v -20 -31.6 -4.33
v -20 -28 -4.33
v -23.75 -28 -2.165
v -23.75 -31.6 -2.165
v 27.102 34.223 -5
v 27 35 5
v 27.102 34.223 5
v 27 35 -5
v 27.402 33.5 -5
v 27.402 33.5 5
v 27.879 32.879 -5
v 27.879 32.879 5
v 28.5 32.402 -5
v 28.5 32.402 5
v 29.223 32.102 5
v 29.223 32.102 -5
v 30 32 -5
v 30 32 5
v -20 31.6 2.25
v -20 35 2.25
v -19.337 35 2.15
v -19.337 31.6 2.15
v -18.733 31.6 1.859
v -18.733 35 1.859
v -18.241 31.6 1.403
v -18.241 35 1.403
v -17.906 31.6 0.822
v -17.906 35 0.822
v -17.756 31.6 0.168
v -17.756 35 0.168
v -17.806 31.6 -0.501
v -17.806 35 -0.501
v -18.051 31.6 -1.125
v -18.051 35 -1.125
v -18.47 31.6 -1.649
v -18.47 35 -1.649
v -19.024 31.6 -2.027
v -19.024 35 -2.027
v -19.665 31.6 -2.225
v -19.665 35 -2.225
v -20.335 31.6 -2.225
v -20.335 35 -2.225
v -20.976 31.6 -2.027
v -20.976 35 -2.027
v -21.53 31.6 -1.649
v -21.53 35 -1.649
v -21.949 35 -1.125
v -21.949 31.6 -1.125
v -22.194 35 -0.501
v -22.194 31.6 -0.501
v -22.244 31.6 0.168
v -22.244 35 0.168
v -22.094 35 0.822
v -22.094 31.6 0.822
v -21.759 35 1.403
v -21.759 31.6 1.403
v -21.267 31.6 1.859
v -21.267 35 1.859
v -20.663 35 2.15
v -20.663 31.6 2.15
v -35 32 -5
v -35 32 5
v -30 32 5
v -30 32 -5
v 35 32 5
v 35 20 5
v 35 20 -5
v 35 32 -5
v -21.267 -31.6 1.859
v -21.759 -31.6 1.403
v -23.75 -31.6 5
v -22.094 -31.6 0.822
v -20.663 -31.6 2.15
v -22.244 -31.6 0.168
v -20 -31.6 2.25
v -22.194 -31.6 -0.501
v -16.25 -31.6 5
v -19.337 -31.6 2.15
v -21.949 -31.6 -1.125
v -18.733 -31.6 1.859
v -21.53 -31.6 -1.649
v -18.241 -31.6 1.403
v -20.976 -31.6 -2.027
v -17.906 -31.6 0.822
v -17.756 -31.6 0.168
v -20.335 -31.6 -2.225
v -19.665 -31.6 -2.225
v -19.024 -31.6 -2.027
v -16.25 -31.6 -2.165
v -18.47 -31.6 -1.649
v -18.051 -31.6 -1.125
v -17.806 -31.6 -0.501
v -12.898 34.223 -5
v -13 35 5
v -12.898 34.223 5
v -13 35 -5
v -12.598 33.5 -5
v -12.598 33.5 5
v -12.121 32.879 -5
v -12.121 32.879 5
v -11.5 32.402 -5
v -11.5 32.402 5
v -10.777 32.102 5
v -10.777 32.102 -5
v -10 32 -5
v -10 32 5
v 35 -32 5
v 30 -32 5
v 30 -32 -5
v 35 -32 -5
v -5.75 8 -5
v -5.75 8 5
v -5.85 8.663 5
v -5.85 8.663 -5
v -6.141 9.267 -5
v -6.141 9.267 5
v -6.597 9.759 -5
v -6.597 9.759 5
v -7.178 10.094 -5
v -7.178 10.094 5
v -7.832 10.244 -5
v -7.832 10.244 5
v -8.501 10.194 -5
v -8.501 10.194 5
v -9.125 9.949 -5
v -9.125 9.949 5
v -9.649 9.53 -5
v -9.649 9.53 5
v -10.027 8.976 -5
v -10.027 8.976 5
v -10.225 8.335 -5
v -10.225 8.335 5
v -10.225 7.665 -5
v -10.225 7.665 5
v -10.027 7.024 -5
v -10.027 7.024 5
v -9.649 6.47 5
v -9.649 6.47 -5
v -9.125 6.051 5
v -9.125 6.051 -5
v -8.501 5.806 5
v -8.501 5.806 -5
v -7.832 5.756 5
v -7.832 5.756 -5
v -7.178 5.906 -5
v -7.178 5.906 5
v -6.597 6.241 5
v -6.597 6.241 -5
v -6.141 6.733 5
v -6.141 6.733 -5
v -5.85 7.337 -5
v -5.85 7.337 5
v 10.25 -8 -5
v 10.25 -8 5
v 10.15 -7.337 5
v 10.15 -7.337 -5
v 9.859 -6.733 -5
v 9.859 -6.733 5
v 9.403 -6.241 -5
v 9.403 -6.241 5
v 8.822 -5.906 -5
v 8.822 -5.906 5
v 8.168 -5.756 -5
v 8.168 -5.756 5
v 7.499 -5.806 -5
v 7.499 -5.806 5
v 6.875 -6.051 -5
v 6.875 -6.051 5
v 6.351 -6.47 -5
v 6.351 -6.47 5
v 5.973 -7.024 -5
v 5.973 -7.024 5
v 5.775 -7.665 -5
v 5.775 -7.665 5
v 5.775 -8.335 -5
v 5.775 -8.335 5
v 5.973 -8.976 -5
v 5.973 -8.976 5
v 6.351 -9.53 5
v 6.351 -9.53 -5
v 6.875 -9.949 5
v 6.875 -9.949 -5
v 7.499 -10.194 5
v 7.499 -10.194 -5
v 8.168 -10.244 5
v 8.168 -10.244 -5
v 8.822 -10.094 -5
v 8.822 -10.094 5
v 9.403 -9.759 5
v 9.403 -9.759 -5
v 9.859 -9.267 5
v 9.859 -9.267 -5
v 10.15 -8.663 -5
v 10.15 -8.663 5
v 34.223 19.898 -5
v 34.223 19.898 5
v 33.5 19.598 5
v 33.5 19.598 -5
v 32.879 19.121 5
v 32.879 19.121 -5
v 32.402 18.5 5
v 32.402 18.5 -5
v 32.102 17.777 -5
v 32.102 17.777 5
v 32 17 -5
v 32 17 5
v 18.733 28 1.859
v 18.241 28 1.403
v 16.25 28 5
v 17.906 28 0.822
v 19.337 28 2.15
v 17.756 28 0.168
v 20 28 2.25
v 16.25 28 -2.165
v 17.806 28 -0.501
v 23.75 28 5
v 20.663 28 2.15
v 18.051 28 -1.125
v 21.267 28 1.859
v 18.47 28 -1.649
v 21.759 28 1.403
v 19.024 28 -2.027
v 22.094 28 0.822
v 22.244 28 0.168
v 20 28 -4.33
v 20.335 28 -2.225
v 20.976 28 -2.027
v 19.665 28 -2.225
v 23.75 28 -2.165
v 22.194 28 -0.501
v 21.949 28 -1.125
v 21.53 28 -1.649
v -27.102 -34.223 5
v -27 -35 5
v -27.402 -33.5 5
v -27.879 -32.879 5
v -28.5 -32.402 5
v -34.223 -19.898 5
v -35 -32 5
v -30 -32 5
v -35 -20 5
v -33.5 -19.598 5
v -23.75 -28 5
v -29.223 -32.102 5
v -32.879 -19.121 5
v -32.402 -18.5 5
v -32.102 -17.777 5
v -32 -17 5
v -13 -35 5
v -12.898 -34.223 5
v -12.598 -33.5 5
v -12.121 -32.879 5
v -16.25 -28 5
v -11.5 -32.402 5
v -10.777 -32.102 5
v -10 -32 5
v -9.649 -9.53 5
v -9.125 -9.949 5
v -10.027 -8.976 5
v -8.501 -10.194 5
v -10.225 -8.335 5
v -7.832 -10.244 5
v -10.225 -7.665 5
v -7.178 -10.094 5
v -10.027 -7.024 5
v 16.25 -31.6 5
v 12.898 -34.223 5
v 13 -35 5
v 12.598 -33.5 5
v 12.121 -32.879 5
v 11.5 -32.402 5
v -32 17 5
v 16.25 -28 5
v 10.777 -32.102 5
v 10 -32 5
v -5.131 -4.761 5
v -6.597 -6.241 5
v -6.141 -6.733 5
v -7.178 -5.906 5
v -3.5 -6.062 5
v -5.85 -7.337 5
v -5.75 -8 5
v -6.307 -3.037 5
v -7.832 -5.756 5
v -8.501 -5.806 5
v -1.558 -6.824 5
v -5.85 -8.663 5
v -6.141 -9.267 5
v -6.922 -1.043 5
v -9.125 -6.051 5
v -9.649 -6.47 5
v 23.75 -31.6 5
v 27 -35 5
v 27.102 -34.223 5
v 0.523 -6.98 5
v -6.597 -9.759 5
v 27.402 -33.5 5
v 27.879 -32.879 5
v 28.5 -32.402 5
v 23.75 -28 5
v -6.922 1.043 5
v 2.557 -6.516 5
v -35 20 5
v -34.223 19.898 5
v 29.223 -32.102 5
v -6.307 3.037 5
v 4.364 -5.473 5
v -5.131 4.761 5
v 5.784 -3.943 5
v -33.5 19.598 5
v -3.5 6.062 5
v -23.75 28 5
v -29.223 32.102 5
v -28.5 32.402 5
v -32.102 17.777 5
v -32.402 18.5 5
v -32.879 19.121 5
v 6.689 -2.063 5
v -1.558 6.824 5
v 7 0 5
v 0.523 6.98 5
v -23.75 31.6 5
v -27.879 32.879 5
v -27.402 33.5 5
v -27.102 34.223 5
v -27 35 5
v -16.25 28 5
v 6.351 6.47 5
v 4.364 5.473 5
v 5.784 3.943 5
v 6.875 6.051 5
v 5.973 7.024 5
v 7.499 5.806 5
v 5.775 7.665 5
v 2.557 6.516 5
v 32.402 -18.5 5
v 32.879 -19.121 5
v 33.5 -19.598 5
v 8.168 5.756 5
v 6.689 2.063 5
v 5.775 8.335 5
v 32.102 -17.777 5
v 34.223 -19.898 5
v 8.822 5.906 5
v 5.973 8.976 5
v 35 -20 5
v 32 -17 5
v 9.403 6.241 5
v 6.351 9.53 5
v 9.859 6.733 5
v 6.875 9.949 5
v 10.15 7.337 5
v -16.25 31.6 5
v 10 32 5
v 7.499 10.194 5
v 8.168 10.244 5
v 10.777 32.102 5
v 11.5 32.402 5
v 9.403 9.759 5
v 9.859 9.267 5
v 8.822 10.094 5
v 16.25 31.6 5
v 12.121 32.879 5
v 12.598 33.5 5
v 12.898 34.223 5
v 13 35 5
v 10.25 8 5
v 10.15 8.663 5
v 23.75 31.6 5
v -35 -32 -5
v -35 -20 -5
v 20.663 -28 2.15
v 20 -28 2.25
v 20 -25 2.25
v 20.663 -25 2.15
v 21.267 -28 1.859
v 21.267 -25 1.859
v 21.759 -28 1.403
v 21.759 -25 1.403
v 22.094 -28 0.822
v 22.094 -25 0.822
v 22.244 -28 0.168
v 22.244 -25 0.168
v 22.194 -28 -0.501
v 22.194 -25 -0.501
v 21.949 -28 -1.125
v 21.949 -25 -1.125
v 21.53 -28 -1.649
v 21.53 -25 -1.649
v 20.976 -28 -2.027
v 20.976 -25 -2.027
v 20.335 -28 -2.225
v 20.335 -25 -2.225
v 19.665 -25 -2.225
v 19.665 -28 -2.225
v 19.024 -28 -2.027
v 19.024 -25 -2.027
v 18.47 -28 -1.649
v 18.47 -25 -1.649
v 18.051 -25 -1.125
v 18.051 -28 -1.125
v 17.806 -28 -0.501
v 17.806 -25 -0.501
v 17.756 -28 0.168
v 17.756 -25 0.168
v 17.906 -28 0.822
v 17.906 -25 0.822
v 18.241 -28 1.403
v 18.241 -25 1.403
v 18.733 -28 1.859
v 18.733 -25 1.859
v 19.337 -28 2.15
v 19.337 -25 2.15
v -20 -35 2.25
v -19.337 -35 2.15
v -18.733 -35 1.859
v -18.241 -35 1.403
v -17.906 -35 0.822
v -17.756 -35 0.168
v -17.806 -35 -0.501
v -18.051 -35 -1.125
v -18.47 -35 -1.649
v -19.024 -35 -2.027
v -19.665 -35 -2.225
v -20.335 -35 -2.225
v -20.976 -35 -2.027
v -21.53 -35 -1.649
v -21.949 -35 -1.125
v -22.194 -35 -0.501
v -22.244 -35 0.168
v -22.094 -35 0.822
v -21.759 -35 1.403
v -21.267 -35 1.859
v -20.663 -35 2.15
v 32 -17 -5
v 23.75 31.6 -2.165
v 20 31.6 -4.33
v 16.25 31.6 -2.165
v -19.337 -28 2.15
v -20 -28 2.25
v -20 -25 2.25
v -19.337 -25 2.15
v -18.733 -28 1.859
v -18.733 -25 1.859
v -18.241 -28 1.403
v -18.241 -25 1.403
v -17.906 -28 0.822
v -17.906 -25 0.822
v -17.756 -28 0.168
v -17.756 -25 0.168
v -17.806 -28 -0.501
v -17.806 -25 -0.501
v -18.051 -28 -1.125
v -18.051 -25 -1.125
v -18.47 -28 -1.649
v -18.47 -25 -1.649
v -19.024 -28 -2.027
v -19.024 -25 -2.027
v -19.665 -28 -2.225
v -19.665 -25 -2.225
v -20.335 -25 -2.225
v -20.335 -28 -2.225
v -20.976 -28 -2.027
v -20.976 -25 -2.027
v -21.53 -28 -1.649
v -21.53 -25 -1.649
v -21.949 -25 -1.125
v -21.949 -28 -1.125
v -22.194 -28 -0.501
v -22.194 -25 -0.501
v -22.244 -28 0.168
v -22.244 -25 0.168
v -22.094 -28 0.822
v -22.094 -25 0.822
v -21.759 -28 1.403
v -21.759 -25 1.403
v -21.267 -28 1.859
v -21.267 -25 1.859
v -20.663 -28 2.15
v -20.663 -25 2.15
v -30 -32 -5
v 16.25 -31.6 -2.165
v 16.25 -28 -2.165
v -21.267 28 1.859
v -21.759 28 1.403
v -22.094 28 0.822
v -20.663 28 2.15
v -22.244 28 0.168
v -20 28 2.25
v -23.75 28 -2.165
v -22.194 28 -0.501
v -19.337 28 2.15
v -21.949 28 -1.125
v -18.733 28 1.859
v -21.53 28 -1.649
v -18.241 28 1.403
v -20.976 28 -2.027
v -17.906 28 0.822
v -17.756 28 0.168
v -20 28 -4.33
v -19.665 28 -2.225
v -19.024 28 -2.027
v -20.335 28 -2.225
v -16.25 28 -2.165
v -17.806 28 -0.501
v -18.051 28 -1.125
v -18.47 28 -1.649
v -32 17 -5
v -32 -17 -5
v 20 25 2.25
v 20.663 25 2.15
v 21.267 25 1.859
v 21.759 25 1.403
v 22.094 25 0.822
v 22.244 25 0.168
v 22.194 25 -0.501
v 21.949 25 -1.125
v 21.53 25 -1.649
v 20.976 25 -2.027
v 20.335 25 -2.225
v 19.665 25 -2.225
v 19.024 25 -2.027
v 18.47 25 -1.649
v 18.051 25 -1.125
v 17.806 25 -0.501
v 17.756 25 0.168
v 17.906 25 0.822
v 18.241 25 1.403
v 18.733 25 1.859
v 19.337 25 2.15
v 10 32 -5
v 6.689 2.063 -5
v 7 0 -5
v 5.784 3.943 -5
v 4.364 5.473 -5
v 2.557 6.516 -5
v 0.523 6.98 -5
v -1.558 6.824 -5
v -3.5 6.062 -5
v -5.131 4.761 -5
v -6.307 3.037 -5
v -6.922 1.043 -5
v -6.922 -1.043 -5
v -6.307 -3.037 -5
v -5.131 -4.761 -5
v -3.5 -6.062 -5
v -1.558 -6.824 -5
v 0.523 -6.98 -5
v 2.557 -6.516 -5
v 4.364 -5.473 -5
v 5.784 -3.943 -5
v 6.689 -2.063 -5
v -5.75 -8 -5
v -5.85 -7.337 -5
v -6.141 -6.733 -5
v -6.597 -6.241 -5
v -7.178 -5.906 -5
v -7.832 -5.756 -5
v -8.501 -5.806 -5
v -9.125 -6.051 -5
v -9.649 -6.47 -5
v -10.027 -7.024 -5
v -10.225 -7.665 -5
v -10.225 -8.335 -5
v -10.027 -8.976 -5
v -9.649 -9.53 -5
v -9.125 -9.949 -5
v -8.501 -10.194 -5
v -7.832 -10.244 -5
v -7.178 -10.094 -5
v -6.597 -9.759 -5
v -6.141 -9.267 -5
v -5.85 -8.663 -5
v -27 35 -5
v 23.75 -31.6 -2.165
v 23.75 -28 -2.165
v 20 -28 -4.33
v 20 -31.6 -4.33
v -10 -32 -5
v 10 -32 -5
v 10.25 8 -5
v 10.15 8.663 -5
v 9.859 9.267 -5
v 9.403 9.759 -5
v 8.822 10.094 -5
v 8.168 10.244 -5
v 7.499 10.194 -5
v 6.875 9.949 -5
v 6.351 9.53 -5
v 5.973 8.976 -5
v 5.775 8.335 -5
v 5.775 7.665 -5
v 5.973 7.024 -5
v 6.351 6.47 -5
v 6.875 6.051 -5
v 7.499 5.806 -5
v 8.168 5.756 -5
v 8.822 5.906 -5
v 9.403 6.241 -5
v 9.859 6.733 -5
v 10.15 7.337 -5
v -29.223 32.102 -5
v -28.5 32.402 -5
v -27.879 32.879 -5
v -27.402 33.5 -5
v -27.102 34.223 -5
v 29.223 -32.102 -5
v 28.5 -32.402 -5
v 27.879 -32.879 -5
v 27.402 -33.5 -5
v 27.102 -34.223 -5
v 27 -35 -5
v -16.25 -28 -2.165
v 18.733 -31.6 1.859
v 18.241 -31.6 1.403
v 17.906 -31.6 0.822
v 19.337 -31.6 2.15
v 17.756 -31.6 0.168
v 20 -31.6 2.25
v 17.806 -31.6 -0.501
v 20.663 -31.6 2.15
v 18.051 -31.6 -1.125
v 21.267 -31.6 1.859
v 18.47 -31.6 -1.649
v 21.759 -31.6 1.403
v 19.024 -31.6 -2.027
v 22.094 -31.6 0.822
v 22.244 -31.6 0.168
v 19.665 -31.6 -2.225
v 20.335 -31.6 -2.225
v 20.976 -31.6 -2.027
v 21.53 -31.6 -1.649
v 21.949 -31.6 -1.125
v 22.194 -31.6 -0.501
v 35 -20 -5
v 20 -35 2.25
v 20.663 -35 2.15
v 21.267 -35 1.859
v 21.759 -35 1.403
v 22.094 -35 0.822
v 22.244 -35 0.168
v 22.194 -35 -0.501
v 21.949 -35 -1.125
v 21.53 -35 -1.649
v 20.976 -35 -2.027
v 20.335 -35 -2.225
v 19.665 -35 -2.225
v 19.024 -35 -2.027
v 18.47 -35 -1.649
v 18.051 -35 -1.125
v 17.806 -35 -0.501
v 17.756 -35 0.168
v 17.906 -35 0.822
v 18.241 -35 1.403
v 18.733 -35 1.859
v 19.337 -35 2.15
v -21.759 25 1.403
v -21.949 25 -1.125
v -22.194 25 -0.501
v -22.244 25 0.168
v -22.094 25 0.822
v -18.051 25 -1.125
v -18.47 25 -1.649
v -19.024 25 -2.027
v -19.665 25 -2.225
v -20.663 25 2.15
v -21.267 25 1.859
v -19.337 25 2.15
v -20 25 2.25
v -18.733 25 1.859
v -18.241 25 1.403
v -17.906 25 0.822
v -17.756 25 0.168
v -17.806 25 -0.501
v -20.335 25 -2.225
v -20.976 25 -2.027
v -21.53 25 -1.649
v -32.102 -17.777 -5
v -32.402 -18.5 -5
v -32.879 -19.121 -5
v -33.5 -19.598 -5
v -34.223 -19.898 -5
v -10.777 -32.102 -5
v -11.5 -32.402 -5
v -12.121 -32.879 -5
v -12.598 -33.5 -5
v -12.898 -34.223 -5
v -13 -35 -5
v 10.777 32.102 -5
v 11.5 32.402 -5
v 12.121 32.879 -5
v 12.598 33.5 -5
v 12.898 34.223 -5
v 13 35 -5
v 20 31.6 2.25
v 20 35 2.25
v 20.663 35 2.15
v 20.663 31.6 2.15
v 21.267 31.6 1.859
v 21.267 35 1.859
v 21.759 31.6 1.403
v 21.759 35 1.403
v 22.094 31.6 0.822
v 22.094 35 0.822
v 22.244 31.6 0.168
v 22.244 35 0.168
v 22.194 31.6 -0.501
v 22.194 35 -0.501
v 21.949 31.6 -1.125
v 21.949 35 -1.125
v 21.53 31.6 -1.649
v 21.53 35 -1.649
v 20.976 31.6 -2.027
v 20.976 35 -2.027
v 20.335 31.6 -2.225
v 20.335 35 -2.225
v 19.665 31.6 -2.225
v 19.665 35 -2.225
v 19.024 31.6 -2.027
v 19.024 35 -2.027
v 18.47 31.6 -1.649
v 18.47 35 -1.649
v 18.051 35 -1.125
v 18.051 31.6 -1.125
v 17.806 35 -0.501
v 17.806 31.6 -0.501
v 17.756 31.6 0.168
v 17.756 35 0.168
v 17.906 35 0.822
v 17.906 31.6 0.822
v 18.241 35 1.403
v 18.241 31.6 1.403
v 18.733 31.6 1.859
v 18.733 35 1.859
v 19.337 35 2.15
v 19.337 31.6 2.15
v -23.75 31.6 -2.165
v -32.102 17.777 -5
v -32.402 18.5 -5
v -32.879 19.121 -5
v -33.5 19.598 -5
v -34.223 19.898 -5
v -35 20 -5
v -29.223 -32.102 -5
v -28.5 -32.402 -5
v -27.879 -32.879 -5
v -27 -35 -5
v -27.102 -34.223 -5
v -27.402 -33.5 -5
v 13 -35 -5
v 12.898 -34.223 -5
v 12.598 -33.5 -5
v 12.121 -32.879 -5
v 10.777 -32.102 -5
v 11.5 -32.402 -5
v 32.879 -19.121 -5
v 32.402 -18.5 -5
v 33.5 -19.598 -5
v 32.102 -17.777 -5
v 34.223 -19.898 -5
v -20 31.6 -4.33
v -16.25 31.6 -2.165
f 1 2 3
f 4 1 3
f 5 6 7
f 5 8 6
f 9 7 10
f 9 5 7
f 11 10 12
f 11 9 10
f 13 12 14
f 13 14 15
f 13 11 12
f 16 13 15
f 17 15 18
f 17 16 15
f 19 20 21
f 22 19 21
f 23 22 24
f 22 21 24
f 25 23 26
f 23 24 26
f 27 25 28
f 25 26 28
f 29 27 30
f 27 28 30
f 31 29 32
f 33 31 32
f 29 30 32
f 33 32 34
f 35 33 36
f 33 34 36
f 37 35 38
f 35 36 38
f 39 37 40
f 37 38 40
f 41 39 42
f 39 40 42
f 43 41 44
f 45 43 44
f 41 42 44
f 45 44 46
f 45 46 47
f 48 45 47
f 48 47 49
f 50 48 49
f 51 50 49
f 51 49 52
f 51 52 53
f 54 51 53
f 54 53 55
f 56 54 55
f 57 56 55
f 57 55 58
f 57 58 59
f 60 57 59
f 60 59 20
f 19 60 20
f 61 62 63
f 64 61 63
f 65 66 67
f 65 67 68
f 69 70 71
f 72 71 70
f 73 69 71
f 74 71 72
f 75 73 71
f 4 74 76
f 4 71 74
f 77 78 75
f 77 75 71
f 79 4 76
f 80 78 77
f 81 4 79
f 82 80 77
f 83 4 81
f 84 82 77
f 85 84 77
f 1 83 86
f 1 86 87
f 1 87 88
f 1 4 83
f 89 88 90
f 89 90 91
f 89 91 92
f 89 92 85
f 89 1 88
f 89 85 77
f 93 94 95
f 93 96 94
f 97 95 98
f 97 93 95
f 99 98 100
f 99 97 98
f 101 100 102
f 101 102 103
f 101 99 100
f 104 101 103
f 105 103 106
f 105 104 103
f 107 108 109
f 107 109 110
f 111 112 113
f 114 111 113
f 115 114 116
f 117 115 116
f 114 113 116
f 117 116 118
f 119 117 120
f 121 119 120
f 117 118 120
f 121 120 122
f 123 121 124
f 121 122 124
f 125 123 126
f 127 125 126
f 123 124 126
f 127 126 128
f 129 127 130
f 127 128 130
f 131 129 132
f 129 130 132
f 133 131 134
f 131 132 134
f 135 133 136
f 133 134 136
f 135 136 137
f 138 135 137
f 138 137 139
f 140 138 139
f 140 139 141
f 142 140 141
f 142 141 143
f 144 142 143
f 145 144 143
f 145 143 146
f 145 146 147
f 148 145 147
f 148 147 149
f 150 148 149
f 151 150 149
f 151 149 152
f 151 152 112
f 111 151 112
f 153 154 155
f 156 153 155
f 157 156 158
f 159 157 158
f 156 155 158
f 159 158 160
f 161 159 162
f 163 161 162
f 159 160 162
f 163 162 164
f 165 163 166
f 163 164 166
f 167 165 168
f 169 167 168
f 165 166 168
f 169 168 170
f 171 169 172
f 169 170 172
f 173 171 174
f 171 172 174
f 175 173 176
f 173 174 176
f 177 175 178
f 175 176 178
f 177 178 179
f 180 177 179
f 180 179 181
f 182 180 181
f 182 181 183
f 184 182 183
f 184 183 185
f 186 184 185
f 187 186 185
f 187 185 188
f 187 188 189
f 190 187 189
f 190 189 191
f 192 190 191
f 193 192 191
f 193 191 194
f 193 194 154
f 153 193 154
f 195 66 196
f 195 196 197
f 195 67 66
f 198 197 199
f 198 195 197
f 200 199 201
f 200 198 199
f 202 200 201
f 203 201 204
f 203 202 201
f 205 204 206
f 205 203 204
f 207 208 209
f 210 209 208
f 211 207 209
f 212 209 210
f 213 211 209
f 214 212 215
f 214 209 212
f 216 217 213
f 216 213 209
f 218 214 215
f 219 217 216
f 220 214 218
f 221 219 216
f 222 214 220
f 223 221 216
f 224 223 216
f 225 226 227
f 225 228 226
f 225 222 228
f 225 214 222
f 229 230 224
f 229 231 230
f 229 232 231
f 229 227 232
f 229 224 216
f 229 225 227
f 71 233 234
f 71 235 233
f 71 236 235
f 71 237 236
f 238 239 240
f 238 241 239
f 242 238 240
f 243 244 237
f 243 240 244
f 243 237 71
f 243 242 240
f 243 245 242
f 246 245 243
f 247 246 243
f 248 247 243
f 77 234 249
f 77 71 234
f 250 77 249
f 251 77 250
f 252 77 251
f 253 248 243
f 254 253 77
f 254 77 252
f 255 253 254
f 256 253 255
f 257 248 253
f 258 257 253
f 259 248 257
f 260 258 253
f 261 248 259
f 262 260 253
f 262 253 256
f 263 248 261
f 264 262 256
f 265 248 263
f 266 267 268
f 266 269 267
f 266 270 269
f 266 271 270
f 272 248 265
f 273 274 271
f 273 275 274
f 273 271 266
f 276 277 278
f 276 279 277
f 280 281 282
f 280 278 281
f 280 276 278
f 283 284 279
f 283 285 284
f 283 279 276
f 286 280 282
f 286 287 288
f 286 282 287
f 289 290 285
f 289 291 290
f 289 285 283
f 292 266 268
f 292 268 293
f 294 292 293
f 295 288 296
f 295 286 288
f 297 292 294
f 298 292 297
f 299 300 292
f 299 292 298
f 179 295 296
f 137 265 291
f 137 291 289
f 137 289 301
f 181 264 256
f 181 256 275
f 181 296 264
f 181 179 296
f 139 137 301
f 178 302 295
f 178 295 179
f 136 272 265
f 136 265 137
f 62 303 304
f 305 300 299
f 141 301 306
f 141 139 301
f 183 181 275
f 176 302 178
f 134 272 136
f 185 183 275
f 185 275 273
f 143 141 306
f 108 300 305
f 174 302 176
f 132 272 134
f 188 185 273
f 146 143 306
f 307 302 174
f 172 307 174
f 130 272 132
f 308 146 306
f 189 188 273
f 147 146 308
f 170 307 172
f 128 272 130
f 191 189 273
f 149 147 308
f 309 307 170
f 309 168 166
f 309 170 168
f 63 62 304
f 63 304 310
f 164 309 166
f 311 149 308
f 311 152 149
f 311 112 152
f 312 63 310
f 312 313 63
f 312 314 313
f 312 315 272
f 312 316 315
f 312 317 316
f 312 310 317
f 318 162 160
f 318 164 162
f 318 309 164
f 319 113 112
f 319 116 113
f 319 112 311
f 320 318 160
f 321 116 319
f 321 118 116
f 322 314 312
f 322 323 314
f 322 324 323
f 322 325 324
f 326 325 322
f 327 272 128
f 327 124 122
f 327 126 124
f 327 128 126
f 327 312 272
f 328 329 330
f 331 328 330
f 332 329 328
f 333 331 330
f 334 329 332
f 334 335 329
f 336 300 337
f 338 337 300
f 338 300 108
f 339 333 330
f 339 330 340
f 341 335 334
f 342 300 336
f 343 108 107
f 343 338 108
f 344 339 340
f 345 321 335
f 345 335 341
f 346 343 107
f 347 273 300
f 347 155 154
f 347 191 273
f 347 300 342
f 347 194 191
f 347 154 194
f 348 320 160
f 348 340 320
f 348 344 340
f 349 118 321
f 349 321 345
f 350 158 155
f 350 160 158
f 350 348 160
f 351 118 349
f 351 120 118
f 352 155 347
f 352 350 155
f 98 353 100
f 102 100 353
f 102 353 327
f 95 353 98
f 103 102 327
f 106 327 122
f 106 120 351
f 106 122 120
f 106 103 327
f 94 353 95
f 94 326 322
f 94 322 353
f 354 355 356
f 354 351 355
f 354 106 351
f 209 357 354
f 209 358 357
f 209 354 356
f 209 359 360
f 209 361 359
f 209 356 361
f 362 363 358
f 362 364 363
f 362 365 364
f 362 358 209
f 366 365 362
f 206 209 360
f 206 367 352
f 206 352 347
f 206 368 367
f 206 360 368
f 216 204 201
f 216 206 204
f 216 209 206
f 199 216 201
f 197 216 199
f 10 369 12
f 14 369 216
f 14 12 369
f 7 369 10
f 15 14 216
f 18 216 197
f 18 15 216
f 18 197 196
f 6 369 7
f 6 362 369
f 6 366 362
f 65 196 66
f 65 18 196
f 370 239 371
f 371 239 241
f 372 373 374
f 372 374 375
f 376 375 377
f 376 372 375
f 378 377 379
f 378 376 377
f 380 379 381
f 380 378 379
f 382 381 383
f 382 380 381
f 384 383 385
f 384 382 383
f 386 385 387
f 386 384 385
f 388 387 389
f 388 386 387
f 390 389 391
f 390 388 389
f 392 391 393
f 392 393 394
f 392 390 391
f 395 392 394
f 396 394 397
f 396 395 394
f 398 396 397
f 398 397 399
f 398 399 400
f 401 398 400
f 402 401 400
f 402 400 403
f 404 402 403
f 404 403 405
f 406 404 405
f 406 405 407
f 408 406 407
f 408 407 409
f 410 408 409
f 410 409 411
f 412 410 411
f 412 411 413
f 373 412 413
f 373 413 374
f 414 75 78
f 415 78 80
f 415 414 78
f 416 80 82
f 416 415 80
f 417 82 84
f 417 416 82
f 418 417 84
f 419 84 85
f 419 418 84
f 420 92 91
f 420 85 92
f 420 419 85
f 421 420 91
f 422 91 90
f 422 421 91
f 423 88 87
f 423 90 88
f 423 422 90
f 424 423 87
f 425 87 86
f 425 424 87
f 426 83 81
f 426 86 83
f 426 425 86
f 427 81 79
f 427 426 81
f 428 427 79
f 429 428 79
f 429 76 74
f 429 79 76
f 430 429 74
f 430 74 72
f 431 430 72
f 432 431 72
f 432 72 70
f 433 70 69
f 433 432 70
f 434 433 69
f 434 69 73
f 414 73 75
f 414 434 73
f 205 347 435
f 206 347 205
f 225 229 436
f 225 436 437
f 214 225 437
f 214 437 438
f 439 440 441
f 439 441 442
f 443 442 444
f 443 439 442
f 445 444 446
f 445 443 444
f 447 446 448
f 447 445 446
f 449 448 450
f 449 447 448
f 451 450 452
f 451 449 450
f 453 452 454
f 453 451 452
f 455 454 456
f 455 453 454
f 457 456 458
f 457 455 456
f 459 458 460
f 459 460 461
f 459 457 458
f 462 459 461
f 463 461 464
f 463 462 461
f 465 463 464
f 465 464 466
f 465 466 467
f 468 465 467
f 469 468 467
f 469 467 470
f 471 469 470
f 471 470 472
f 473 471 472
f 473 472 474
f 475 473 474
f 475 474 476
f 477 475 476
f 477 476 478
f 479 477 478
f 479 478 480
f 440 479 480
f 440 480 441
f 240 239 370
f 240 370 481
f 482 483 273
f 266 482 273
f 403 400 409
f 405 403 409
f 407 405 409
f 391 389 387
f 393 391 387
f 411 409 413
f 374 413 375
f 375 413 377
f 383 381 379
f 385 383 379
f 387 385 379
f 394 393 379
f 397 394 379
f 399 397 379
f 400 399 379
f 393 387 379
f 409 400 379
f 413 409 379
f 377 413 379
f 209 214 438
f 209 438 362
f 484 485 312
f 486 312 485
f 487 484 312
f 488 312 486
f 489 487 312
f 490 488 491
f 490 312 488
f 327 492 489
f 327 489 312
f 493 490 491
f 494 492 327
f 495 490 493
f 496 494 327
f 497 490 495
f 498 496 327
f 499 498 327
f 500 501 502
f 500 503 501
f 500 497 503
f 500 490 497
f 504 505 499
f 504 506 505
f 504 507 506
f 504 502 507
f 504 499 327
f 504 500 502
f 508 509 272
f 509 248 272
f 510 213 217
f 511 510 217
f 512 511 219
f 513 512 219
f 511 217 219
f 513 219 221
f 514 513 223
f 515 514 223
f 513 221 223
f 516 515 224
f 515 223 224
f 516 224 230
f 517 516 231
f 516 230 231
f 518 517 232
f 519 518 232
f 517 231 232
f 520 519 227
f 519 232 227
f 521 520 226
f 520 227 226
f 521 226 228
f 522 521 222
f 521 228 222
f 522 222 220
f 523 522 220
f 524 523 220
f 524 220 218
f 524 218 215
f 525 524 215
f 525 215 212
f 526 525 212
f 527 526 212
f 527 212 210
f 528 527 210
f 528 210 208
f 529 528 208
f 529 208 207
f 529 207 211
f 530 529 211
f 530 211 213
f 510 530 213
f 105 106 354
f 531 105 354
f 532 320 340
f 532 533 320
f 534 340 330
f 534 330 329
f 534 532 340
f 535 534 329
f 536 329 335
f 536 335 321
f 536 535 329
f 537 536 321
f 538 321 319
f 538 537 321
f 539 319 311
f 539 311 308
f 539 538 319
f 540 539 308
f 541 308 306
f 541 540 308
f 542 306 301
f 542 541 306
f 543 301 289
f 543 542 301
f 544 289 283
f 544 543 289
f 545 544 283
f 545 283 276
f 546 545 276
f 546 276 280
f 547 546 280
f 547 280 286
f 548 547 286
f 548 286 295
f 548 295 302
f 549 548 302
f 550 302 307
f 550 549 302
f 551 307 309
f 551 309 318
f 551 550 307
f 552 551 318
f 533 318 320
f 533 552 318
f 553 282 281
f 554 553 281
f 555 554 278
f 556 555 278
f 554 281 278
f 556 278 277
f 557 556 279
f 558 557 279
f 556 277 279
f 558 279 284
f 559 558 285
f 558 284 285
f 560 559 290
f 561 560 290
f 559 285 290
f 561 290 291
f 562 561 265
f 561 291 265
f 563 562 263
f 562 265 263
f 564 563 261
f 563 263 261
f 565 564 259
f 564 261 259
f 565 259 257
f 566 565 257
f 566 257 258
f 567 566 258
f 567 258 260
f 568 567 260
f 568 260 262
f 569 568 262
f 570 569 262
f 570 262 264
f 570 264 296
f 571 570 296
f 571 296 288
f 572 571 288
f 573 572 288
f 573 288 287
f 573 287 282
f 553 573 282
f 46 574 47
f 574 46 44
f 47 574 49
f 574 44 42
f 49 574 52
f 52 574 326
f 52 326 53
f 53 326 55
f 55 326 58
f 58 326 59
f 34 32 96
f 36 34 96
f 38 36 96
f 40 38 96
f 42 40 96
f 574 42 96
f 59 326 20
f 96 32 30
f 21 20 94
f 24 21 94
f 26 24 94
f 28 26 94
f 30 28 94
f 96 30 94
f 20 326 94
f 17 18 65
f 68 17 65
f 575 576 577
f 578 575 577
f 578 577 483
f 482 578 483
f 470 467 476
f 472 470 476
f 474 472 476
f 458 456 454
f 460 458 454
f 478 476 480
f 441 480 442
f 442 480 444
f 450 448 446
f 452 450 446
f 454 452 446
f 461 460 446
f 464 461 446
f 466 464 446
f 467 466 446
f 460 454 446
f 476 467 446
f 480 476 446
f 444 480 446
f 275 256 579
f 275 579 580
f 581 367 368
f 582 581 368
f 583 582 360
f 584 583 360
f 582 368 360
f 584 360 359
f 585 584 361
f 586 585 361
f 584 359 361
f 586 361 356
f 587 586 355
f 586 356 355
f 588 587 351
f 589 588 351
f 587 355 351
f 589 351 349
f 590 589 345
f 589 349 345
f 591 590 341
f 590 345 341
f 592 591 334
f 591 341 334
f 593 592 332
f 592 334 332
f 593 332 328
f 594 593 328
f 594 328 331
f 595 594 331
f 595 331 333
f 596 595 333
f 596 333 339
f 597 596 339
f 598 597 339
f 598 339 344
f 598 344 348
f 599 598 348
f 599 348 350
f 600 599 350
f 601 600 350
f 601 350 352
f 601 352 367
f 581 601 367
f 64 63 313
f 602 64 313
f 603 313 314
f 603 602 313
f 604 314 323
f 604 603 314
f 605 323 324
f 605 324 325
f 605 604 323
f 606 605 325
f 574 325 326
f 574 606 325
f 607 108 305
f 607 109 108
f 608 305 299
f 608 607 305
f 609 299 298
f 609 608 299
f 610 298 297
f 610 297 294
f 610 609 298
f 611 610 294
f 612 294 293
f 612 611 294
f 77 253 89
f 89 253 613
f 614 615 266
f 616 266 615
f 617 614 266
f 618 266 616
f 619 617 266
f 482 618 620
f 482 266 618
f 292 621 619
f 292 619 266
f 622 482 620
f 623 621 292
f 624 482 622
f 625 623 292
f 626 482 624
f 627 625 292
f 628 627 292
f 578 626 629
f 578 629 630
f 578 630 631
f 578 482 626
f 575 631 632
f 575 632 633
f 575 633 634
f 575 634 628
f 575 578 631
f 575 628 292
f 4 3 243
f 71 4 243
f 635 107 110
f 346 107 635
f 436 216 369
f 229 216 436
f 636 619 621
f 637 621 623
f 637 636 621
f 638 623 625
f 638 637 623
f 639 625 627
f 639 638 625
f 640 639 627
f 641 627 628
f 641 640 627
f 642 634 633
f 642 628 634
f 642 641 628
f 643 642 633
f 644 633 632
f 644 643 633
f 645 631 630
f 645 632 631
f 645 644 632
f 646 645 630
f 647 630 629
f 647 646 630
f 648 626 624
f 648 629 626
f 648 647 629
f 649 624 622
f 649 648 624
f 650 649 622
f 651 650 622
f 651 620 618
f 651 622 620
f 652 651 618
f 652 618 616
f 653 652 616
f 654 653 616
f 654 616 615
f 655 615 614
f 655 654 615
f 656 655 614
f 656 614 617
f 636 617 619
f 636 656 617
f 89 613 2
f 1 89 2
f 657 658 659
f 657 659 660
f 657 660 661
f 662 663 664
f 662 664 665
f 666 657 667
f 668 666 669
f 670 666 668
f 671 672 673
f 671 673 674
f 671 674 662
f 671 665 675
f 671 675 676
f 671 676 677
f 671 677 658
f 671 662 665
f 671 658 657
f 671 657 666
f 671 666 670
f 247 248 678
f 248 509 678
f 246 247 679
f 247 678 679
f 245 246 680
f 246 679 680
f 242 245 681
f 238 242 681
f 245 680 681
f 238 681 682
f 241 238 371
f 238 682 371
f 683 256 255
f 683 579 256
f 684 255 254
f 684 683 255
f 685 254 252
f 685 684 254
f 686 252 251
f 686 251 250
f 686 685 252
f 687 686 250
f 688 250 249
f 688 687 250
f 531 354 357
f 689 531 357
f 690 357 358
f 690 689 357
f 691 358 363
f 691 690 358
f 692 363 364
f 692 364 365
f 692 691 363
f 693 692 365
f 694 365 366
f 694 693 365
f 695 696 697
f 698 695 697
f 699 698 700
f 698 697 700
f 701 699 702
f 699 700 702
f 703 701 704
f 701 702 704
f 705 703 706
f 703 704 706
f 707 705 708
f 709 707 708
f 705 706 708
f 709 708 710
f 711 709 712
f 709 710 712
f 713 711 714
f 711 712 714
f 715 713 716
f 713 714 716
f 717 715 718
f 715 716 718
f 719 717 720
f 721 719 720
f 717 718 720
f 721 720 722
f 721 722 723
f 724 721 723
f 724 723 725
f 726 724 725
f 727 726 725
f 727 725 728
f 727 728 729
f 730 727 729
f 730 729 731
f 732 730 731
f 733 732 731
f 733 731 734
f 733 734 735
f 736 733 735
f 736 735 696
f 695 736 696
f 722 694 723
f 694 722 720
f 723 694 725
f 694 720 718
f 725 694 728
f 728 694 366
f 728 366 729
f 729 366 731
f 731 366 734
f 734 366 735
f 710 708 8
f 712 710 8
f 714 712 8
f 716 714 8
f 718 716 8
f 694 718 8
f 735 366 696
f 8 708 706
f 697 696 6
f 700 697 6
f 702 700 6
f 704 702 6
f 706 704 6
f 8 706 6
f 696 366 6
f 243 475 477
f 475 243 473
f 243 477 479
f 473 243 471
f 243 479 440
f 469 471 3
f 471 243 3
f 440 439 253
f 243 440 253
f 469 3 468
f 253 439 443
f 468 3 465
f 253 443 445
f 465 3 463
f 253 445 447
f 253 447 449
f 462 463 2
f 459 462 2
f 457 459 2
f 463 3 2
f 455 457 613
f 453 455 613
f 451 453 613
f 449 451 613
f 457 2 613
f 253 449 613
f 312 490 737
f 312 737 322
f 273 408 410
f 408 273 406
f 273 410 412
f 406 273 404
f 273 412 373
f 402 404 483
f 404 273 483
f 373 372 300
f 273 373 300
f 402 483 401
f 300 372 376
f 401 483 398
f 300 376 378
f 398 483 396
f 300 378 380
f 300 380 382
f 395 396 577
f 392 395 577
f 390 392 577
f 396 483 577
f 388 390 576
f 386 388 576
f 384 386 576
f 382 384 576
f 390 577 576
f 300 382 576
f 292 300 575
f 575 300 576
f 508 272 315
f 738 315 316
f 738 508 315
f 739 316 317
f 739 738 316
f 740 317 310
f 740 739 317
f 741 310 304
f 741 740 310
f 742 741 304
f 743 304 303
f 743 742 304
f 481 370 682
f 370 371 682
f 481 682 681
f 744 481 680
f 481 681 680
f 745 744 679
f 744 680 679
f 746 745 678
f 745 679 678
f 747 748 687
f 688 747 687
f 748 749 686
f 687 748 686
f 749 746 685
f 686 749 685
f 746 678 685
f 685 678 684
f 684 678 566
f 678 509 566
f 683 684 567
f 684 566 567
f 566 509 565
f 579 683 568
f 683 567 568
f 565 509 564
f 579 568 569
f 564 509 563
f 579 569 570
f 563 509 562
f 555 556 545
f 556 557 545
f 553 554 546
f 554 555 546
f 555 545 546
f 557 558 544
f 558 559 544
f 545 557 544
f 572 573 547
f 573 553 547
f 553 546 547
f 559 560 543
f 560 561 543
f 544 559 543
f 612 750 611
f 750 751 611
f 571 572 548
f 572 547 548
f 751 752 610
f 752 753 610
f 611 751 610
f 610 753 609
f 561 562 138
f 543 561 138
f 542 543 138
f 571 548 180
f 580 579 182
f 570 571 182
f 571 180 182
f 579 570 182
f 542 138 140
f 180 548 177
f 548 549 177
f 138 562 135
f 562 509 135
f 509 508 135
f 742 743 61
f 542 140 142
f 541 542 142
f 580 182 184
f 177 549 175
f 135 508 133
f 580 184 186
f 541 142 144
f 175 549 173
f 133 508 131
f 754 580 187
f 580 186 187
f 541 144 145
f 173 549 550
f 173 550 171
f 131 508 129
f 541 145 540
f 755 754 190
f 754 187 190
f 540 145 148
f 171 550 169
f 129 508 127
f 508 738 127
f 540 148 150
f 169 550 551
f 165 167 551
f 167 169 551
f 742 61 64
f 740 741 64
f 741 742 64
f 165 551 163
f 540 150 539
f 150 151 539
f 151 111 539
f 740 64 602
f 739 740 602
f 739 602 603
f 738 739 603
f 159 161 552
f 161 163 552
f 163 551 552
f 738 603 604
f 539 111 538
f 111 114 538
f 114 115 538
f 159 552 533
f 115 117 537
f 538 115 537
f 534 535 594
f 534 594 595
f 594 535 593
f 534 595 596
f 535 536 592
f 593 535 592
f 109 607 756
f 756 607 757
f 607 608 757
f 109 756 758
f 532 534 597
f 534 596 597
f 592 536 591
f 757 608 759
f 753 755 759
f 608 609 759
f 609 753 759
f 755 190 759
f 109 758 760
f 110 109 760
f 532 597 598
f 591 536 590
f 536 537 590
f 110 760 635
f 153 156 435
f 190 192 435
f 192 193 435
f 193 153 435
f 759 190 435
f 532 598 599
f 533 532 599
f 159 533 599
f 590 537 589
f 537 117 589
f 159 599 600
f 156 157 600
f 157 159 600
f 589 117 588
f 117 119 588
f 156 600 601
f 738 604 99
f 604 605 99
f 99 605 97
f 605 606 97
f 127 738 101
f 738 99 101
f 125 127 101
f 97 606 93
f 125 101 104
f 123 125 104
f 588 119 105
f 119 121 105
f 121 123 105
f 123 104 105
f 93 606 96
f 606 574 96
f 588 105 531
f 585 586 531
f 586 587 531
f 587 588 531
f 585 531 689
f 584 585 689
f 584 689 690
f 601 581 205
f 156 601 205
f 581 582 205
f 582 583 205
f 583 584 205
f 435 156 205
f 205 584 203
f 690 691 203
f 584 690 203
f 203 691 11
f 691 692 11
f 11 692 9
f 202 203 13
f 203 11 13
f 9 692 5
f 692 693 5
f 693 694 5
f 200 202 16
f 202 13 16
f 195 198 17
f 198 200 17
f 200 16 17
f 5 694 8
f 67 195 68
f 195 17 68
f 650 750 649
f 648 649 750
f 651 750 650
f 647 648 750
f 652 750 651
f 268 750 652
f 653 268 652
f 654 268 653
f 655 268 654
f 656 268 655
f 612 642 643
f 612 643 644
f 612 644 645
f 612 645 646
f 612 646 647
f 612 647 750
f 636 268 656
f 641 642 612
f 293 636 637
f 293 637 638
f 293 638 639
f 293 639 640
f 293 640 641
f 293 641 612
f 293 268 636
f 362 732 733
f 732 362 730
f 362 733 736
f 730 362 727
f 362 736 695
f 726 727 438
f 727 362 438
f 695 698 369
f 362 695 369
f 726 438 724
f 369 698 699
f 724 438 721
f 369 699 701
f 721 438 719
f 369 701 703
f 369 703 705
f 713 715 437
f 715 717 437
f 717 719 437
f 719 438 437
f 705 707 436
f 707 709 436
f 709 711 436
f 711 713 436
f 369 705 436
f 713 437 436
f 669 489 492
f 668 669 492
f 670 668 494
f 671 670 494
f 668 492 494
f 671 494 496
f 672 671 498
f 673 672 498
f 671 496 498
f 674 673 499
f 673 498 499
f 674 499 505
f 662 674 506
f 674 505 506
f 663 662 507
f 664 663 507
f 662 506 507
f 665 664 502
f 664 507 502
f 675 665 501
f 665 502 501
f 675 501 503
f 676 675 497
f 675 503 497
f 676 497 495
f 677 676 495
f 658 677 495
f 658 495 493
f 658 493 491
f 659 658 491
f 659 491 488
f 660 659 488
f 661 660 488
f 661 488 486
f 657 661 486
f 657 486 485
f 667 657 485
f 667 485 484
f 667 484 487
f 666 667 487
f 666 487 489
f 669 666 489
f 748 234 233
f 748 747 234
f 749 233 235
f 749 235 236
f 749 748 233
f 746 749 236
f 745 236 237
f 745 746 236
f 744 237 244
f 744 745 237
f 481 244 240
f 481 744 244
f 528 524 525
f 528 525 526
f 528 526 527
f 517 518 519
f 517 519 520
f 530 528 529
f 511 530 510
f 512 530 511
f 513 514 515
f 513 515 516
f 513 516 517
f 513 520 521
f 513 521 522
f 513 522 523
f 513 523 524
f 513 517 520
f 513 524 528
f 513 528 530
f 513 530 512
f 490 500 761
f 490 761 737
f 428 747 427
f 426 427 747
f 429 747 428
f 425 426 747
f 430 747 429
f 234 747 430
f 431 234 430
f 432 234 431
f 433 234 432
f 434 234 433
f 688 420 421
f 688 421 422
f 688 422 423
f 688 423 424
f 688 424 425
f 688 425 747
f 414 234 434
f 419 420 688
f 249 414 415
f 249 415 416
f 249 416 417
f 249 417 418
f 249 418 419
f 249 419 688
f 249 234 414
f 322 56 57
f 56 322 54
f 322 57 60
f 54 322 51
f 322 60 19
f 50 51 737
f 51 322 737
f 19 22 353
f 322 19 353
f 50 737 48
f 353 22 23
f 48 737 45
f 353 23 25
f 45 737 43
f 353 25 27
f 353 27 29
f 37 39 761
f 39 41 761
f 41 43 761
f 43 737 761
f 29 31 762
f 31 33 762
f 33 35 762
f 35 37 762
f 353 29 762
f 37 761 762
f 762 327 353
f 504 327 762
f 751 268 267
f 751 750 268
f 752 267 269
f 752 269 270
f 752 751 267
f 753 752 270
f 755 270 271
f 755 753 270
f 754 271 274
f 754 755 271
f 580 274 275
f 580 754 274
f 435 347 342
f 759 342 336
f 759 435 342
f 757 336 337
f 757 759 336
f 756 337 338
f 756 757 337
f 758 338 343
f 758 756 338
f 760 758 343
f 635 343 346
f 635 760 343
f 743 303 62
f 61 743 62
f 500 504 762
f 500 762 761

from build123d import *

# Parameters (mm, degrees)
CROQUIS1_W              = 70
CROQUIS1_H              = 70
CROQUIS1_R              = 7
SALIENTE_EXTRUIR1_DEPTH = 5
CROQUIS2_R              = 2.25
CROQUIS2_W              = 26
CROQUIS2_H              = 6
CROQUIS2_W_2            = 6
CROQUIS2_H_2            = 26
CORTAR_EXTRUIR1_DEPTH   = 51.497524692
CROQUIS4_R              = 2.25
CORTAR_EXTRUIR2_DEPTH   = 10
CORTAR_EXTRUIR3_DEPTH   = 3.6
CROQUIS6_W              = 8
CROQUIS6_H              = 3
CROQUIS6_W_2            = 6
CROQUIS6_H_2            = 40
CORTAR_EXTRUIR4_DEPTH   = 51.497524692
REDONDEO1_R             = 3


with BuildPart() as part:
    # Croquis1 → Saliente-Extruir1 (new, symmetric)
    with BuildSketch(Plane.XY):
        Rectangle(CROQUIS1_W, CROQUIS1_H)
        Circle(CROQUIS1_R, mode=Mode.SUBTRACT)
    extrude(amount=SALIENTE_EXTRUIR1_DEPTH, both=True)

    # Croquis2 → Cortar-Extruir1 (cut, through all)
    with BuildSketch(Plane.XY.offset(5)):
        with Locations((8, 8)):
            Circle(CROQUIS2_R)
        with Locations((8, -8)):
            Circle(CROQUIS2_R)
        with Locations((-8, -8)):
            Circle(CROQUIS2_R)
        with Locations((-8, 8)):
            Circle(CROQUIS2_R)
        with Locations((0, 35)):
            Rectangle(CROQUIS2_W, CROQUIS2_H)
        with Locations((-35, 0)):
            Rectangle(CROQUIS2_W_2, CROQUIS2_H_2)
        with Locations((35, 0)):
            Rectangle(CROQUIS2_W_2, CROQUIS2_H_2)
        with Locations((0, -35)):
            Rectangle(CROQUIS2_W, CROQUIS2_H)
    extrude(amount=-CORTAR_EXTRUIR1_DEPTH, mode=Mode.SUBTRACT)

    # Croquis4 → Cortar-Extruir2 (cut)
    with BuildSketch(Plane(origin=(0, 35, 0), x_dir=(1, 0, 0), z_dir=(0, 1, 0))):
        with Locations(Location((-20, 0, 0), (0, 0, 270))):
            Circle(CROQUIS4_R)
        with Locations(Location((20, 0, 0), (0, 0, 270))):
            Circle(CROQUIS4_R)
    cortar_extruir2 = extrude(amount=-CORTAR_EXTRUIR2_DEPTH, mode=Mode.SUBTRACT)

    # Croquis5 → Cortar-Extruir3 (cut)
    with BuildSketch(Plane(origin=(0, 28, 0), x_dir=(1, 0, 0), z_dir=(0, 1, 0))):
        Polygon((-23.75, -2.165063509), (-23.75, -5), (-16.25, -5), (-16.25, -2.165063509), (-16.25, 2.165063509), (-20, 4.330127019), (-23.75, 2.165063509), align=None)
        Polygon((16.25, 2.165063509), (16.25, -2.165063509), (16.25, -5), (23.75, -5), (23.75, -2.165063509), (23.75, 2.165063509), (20, 4.330127019), align=None)
    cortar_extruir3 = extrude(amount=CORTAR_EXTRUIR3_DEPTH, mode=Mode.SUBTRACT)

    # Simetría1: Cortar-Extruir2, Cortar-Extruir3 across plane
    add(cortar_extruir2.mirror(Plane.ZX), mode=Mode.SUBTRACT)
    add(cortar_extruir3.mirror(Plane.ZX), mode=Mode.SUBTRACT)

    # Croquis6 → Cortar-Extruir4 (cut, through all)
    with BuildSketch(Plane.XY.offset(5)):
        with Locations((-31, 33.5)):
            Rectangle(CROQUIS6_W, CROQUIS6_H)
        with Locations((31, 33.5)):
            Rectangle(CROQUIS6_W, CROQUIS6_H)
        with Locations((31, -33.5)):
            Rectangle(CROQUIS6_W, CROQUIS6_H)
        with Locations((-31, -33.5)):
            Rectangle(CROQUIS6_W, CROQUIS6_H)
        with Locations((-35, 0)):
            Rectangle(CROQUIS6_W_2, CROQUIS6_H_2)
        with Locations((35, 0)):
            Rectangle(CROQUIS6_W_2, CROQUIS6_H_2)
    extrude(amount=-CORTAR_EXTRUIR4_DEPTH, mode=Mode.SUBTRACT)

    # Redondeo1
    redondeo1_edges = [part.edges().sort_by_distance(p)[0] for p in [
        (27, -32, 0),
        (13, -32, 0),
        (-13, -32, 0),
        (-27, -32, 0),
        (-32, -20, 0),
        (-32, 20, 0),
        (32, -20, 0),
        (32, 20, 0),
        (27, 32, 0),
        (13, 32, 0),
        (-27, 32, 0),
        (-13, 32, 0),
    ]]
    fillet(redondeo1_edges, radius=REDONDEO1_R - 0.0001)  # a hair under: the kernel refuses the full size


solid = part.part
